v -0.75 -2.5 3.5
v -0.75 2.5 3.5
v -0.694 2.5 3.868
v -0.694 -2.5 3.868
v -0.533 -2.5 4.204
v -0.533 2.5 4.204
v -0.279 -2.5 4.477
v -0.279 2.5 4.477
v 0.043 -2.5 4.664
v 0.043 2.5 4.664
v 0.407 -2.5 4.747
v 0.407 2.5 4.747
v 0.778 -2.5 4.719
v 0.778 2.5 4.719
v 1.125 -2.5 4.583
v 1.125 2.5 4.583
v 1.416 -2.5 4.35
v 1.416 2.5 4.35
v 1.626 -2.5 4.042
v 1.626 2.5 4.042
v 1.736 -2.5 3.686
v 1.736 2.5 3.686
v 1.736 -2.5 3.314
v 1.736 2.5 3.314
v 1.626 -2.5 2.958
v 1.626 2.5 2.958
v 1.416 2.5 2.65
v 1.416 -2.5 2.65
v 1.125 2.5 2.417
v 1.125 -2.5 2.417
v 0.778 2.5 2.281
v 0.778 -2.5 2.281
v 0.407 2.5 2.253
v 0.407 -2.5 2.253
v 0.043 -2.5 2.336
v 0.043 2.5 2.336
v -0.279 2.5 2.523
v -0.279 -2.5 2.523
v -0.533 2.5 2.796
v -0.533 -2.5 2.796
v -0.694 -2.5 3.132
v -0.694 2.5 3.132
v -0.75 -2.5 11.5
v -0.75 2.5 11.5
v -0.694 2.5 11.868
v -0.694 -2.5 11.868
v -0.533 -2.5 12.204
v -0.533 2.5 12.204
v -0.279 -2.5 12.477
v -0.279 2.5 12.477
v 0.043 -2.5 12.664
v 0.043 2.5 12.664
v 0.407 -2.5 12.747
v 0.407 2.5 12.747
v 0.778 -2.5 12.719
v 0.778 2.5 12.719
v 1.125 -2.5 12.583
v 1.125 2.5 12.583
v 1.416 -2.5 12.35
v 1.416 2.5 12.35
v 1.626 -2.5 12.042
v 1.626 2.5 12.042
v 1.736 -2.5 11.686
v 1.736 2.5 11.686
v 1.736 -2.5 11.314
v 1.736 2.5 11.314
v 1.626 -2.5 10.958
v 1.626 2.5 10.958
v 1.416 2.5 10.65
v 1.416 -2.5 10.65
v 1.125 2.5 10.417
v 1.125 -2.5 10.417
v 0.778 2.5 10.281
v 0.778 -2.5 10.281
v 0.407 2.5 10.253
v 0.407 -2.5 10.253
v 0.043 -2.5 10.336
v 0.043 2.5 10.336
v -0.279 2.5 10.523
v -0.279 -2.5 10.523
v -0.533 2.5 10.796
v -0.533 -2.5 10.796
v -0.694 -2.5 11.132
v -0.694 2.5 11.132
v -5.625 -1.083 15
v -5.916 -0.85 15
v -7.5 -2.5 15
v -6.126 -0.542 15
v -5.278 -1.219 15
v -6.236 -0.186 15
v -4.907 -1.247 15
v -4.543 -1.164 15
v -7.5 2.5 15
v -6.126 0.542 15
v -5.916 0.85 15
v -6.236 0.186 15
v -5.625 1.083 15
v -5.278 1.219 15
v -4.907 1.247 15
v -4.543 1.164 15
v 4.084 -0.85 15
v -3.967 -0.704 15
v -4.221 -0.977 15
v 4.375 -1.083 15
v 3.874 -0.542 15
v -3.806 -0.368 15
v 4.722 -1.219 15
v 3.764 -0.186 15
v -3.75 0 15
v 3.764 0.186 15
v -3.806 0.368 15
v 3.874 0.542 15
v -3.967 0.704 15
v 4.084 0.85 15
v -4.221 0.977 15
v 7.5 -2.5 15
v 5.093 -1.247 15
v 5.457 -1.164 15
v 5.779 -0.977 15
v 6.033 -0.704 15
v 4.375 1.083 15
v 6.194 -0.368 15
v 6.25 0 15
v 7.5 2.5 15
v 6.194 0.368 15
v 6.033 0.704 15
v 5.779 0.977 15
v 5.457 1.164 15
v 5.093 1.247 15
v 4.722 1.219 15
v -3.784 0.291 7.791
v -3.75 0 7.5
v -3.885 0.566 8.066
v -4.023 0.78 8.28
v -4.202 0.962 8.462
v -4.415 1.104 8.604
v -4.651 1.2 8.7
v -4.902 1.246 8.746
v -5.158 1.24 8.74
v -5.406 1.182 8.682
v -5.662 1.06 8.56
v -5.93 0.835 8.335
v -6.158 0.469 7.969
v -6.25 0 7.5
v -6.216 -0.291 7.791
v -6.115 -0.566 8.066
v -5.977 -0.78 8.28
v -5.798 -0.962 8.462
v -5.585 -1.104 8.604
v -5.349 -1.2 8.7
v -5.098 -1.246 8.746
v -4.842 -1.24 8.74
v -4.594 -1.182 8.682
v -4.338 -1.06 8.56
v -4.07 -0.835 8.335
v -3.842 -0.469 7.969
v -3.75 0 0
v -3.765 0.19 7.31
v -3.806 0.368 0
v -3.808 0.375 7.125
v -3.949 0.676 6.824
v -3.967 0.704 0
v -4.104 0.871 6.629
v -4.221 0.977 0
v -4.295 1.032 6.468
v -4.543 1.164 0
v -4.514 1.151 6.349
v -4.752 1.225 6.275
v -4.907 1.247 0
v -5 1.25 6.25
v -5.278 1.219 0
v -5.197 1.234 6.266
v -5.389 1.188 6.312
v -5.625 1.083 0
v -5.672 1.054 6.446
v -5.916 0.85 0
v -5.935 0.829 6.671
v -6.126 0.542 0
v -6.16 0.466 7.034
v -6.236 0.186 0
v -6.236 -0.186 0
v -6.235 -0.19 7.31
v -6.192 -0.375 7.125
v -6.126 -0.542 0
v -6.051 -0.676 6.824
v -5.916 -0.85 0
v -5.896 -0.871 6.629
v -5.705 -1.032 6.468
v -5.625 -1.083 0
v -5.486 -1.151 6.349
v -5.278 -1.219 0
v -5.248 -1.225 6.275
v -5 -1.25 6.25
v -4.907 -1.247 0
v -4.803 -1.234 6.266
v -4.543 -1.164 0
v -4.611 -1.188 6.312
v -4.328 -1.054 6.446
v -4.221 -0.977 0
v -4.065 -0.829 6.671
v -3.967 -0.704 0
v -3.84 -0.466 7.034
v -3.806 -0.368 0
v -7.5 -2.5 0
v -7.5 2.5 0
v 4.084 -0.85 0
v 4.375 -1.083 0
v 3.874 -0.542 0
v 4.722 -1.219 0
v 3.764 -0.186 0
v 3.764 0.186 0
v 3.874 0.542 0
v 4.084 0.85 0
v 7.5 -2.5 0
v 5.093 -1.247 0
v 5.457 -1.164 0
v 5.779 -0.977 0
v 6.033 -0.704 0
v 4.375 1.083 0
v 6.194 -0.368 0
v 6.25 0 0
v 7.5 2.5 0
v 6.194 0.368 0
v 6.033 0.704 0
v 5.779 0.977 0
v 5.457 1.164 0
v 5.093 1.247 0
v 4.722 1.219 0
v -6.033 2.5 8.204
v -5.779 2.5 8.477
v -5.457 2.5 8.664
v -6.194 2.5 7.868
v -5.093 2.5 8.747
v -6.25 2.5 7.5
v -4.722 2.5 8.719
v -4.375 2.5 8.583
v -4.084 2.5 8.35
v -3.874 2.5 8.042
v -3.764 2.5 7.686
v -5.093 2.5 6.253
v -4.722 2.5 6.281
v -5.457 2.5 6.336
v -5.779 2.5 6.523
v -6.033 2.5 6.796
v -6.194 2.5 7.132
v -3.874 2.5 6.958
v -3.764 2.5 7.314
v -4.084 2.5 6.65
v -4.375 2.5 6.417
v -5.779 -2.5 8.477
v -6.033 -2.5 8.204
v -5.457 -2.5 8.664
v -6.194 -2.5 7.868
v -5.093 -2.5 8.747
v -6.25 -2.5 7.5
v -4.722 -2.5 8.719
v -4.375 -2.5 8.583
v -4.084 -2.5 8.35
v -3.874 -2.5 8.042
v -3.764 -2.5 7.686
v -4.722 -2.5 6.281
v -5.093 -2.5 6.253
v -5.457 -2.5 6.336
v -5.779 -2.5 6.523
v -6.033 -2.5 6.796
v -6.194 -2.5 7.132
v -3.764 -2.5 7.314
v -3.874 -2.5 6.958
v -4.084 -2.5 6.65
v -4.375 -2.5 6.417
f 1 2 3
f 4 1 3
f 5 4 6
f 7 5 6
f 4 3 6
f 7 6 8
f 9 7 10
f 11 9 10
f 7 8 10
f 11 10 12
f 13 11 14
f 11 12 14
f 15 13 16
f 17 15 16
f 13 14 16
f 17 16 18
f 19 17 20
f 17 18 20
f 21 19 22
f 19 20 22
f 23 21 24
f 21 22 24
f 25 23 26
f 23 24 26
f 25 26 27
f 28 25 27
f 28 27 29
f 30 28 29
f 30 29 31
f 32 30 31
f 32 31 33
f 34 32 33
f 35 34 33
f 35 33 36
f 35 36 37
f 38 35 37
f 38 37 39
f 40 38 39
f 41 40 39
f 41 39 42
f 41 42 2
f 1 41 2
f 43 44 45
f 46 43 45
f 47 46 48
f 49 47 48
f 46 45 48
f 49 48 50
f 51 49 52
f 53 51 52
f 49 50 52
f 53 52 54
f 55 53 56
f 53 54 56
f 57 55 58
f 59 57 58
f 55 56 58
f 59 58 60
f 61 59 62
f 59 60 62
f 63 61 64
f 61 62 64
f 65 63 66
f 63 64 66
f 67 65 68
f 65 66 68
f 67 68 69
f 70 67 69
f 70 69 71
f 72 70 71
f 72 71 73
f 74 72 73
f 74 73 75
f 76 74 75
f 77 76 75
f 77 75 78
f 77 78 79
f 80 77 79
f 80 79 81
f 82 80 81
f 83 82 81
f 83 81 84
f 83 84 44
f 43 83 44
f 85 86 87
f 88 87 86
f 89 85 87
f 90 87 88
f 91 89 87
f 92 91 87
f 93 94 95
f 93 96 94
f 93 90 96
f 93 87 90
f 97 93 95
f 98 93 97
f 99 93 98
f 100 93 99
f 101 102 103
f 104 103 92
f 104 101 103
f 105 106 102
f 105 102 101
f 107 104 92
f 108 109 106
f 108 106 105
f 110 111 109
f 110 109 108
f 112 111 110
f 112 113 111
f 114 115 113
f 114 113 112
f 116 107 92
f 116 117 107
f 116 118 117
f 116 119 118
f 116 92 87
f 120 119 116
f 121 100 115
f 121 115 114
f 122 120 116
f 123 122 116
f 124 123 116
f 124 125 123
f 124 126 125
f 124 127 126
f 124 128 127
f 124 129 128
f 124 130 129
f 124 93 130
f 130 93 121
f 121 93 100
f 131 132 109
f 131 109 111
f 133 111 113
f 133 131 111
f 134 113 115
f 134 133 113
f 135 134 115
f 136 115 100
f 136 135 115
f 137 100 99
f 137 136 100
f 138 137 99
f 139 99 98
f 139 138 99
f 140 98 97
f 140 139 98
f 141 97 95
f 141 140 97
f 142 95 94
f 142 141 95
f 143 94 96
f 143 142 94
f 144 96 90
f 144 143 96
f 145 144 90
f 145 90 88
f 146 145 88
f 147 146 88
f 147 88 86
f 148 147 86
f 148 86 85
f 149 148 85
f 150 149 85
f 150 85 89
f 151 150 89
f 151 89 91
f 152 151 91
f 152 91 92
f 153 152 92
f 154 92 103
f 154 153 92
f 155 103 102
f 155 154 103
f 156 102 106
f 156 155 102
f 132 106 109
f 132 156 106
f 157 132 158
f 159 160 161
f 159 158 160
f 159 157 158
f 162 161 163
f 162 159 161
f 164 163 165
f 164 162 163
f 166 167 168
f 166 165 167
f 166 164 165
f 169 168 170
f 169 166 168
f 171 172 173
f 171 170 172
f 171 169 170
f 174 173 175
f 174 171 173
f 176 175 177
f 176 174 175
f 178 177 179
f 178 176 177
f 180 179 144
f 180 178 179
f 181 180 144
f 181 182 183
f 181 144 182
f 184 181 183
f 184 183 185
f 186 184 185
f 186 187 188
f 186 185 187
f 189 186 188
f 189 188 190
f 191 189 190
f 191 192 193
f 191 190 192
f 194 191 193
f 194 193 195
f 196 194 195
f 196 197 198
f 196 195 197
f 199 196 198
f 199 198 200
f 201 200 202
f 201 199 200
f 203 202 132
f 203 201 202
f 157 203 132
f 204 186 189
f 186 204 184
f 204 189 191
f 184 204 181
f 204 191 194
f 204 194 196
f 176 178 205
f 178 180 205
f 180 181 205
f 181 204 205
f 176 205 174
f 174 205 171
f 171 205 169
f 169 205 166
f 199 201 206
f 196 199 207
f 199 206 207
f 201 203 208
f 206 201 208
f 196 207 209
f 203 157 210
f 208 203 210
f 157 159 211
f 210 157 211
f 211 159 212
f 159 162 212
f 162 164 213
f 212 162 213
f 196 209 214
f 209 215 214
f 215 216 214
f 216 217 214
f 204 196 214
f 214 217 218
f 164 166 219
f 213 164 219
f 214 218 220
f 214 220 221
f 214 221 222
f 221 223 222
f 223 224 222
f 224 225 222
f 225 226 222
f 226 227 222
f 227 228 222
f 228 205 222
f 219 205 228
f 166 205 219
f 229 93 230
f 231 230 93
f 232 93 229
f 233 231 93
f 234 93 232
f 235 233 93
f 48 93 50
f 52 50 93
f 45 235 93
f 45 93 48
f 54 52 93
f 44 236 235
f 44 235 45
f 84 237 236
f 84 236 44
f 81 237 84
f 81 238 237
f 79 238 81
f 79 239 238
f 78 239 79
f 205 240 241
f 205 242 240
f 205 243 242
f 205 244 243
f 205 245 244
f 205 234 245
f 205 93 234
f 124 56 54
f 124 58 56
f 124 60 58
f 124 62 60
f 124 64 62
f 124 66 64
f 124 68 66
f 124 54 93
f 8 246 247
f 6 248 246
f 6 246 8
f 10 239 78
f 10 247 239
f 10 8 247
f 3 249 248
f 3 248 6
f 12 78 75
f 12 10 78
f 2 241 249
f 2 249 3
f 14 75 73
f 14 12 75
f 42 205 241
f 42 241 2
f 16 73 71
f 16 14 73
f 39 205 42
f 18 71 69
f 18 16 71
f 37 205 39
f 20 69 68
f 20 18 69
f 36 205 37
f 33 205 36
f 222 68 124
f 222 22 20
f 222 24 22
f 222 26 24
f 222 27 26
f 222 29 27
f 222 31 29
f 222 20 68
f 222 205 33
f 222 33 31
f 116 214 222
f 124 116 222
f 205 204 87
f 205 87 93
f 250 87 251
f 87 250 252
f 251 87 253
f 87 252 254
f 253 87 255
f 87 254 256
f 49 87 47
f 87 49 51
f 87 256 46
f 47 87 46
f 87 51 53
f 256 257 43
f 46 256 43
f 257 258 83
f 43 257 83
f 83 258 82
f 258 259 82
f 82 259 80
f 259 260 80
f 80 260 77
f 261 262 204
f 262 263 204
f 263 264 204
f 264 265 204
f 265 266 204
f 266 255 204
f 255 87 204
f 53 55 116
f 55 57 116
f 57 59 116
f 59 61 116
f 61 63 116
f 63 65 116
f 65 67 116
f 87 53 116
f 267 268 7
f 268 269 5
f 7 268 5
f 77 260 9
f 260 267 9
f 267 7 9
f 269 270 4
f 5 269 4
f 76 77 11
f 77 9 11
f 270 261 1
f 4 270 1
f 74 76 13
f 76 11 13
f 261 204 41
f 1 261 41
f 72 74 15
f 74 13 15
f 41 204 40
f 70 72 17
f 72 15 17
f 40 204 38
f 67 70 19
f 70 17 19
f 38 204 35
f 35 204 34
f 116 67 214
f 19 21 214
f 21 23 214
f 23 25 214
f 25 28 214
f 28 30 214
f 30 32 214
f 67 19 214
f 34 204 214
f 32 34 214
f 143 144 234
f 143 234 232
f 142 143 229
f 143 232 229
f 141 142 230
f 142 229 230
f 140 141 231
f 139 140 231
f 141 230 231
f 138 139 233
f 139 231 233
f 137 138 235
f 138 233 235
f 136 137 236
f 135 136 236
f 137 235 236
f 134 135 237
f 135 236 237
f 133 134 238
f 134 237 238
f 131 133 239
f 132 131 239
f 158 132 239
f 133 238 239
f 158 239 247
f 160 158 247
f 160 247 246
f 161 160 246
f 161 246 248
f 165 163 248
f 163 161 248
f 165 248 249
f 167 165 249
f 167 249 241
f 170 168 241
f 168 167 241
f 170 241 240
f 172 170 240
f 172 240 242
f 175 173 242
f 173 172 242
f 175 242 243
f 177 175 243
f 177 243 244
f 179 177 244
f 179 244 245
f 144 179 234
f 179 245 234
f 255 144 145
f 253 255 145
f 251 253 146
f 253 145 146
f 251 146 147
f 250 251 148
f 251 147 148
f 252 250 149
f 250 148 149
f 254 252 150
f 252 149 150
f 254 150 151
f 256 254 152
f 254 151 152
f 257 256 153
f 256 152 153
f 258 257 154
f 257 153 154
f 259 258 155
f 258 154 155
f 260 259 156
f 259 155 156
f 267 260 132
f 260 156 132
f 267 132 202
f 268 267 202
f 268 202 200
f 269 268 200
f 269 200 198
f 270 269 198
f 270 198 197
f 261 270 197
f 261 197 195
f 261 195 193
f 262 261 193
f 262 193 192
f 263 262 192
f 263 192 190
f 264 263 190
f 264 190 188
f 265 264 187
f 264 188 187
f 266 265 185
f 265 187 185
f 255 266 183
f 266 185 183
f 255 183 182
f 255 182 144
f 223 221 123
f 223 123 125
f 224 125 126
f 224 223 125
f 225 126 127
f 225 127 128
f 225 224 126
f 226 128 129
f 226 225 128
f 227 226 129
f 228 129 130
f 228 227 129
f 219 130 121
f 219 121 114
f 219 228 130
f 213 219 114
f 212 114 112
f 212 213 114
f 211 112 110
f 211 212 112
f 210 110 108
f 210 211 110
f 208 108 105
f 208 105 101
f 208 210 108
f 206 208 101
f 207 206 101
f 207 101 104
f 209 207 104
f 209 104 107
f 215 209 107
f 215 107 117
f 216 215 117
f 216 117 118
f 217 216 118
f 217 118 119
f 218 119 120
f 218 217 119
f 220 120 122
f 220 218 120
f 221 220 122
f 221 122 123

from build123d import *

# Parameters (mm, degrees)
F0_W     = 15
F0_H     = 5
F0_R     = 1.25
F1_DEPTH = 15
F3_D     = 2.5


with BuildPart() as f1:
    # F0 (on Top) → F1 (new body)
    with BuildSketch(Plane.XY):
        Rectangle(F0_W, F0_H)
        with Locations((-5, 0)):
            Circle(F0_R, mode=Mode.SUBTRACT)
        with Locations((5, 0)):
            Circle(F0_R, mode=Mode.SUBTRACT)
    extrude(amount=F1_DEPTH)

    # F3 (through all)
    with Locations(Plane.XZ.offset(2.5)):
        with Locations((0.5, 11.5), (-5, 7.5), (0.5, 3.5)):
            Hole(F3_D / 2)


solid = f1.part
